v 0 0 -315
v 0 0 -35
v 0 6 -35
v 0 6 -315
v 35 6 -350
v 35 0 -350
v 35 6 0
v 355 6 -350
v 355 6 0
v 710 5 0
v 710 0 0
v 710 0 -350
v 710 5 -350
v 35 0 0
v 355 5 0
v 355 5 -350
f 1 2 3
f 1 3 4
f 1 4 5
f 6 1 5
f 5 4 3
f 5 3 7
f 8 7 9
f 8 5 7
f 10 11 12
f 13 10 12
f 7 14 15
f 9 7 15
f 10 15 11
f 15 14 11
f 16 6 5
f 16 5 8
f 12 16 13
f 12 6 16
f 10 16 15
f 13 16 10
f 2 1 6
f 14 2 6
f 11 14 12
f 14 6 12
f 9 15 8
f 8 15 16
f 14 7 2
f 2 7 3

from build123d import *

# Parameters (mm, degrees)
SKETCH1_W           = 710
SKETCH1_H           = 350
BOSS_EXTRUDE1_DEPTH = 5
SKETCH2_W           = 355
SKETCH2_H           = 350
BOSS_EXTRUDE2_DEPTH = 1
CUT_EXTRUDE1_DEPTH  = 792.603436071


with BuildPart() as part:
    # Sketch1 → Boss-Extrude1 (new body)
    with BuildSketch(Plane(origin=(0, 0, 0), x_dir=(1, 0, 0), z_dir=(0, 1, 0))):
        with Locations((355, 175)):
            Rectangle(SKETCH1_W, SKETCH1_H)
    extrude(amount=BOSS_EXTRUDE1_DEPTH)

    # Sketch2 → Boss-Extrude2 (add)
    with BuildSketch(Plane(origin=(0, 5, 0), x_dir=(1, 0, 0), z_dir=(0, 1, 0))):
        with Locations((177.5, 175)):
            Rectangle(SKETCH2_W, SKETCH2_H)
    extrude(amount=BOSS_EXTRUDE2_DEPTH)

    # Sketch3 → Cut-Extrude1 (cut, through all)
    with BuildSketch(Plane(origin=(0, 6, 0), x_dir=(1, 0, 0), z_dir=(0, 1, 0))):
        Polygon((0, 350), (0, 315), (35, 350), align=None)
        Polygon((35, 0), (0, 35), (0, 0), align=None)
    extrude(amount=-CUT_EXTRUDE1_DEPTH, mode=Mode.SUBTRACT)


solid = part.part
